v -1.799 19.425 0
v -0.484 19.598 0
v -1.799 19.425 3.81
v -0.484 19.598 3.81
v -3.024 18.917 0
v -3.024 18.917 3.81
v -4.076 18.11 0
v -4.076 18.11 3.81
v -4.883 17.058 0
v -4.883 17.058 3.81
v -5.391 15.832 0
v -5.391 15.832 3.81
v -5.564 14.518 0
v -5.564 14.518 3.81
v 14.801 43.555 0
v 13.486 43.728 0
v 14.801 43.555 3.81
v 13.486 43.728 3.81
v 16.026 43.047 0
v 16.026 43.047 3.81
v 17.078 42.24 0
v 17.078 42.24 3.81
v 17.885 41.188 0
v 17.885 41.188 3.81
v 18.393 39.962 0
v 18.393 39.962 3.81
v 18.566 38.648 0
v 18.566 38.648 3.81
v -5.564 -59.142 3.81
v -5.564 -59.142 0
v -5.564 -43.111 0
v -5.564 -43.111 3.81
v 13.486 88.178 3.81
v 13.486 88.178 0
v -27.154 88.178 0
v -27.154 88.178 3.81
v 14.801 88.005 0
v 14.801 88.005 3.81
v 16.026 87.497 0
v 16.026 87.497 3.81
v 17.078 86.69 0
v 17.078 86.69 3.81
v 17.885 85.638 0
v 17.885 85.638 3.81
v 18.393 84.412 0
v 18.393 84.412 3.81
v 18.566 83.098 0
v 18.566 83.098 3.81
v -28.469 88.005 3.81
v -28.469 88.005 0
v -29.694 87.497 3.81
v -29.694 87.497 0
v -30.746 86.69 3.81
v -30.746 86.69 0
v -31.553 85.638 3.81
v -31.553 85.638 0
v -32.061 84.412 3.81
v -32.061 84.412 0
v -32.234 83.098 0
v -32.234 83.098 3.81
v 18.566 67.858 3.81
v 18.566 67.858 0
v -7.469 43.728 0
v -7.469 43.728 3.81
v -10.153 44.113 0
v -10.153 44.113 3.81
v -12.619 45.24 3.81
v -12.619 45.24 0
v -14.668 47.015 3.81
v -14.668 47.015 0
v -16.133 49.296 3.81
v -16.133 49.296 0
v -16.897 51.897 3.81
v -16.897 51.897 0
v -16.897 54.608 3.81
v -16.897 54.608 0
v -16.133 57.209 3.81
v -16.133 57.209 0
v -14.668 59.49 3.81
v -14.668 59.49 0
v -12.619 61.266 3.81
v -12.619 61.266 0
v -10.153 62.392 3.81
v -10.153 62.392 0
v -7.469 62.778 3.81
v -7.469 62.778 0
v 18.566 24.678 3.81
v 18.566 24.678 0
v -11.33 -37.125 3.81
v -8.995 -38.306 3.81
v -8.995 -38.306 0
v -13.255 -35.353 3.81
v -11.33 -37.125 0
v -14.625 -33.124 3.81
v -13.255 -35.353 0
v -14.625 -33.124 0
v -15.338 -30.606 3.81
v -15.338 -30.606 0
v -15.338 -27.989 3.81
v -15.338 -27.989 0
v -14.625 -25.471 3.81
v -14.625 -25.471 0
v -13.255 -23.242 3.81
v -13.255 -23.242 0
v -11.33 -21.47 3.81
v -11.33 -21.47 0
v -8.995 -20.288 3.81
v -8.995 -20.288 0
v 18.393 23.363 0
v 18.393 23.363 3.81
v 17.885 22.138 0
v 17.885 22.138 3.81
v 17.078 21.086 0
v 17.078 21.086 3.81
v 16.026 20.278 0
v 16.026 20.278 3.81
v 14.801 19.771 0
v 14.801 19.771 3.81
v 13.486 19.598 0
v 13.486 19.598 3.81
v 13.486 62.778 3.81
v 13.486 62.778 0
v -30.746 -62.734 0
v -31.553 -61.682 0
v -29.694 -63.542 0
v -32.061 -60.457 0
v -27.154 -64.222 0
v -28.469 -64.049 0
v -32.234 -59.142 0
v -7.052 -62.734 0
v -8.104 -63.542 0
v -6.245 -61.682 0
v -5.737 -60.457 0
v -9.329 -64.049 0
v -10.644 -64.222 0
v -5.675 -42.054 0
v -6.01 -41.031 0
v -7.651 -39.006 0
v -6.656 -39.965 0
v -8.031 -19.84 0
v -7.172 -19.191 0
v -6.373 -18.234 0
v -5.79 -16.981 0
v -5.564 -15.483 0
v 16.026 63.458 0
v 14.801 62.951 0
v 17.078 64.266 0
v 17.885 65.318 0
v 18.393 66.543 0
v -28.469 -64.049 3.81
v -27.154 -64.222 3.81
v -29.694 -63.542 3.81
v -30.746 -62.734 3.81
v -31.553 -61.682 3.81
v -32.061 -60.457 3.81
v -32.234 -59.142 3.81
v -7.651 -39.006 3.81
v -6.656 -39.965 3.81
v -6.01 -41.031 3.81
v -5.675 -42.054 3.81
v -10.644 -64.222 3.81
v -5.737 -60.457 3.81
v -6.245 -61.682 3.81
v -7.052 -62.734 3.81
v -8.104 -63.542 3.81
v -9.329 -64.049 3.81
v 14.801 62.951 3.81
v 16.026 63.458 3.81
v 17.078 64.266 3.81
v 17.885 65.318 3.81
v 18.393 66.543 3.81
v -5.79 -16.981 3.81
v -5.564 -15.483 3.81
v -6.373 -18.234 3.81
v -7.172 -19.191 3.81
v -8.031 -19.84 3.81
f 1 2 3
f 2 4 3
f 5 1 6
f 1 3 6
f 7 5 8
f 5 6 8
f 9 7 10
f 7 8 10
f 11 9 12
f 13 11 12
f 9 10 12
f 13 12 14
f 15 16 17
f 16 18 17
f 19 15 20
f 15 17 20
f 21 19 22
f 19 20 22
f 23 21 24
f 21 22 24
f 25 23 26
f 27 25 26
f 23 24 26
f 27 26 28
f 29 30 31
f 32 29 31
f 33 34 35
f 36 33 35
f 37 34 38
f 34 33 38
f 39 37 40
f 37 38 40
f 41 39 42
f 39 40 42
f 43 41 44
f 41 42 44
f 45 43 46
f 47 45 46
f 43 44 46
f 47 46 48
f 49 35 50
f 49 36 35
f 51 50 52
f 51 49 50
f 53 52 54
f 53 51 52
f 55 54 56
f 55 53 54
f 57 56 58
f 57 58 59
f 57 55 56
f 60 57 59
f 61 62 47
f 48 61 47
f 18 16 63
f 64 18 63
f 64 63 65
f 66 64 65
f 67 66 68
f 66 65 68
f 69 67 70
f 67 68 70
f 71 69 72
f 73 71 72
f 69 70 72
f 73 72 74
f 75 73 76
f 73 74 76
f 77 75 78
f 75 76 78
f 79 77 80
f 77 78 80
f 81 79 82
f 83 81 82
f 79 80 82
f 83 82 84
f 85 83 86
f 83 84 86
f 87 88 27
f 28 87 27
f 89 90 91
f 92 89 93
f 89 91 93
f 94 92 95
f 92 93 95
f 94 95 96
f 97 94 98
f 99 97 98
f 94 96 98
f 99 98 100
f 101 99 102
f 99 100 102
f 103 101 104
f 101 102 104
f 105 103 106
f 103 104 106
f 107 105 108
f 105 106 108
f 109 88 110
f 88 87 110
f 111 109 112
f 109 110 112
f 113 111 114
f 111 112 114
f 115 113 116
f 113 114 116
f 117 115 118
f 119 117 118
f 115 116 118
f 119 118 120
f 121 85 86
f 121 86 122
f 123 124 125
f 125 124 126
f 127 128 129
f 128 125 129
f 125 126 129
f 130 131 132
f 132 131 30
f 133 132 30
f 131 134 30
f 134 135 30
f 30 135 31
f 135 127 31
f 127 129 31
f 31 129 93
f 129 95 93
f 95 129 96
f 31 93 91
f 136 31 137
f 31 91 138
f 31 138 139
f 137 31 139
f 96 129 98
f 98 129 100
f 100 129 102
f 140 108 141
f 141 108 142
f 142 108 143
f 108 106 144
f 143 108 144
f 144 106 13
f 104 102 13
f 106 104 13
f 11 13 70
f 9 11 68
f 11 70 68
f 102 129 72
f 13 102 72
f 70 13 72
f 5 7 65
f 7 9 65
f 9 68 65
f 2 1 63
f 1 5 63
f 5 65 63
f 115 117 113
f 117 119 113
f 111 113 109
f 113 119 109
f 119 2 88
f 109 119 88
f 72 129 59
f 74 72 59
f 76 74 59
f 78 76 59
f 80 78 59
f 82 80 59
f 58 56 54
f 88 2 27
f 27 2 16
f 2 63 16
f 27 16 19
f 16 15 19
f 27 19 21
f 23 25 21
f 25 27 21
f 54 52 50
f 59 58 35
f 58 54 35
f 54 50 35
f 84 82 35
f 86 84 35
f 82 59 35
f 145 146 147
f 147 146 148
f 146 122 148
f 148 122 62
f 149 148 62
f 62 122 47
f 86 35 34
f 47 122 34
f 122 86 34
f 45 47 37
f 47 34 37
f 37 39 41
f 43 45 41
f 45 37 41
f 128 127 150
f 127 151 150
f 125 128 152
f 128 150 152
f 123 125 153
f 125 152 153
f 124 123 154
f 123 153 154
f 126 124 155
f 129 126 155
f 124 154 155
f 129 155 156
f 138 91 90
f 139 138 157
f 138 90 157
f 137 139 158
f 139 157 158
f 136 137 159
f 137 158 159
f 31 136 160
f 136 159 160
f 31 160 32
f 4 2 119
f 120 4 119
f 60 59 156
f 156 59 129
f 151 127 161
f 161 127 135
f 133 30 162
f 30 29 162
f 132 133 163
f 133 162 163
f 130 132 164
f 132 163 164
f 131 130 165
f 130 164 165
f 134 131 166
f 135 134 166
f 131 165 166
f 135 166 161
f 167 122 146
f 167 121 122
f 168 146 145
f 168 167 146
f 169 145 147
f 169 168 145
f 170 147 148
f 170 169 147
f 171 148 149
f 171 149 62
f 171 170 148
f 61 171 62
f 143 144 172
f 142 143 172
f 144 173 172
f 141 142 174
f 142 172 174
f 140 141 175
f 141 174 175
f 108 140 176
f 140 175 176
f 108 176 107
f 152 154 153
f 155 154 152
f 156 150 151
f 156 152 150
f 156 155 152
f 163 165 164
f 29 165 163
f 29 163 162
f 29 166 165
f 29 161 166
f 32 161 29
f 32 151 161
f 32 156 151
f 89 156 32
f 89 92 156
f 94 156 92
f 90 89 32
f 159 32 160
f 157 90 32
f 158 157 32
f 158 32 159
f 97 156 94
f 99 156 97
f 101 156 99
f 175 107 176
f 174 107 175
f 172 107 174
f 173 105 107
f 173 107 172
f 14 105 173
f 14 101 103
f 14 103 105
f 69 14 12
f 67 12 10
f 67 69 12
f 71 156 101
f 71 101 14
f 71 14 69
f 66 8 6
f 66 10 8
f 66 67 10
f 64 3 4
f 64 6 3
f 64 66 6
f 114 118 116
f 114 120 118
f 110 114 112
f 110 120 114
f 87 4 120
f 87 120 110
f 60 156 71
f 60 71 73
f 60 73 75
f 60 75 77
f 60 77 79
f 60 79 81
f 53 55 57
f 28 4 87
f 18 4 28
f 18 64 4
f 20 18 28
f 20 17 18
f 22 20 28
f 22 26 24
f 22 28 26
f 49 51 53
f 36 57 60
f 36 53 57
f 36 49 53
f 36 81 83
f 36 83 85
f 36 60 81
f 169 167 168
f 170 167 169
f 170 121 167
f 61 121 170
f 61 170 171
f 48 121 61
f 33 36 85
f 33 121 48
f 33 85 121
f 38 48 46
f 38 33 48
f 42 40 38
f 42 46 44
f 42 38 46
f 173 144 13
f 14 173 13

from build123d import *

# Parameters (mm, degrees)
F1_DEPTH = 3.81
F2_W     = 23.2185392497
F2_H     = 19.05
F3_DEPTH = 25.4
F4_R     = 5.08


with BuildPart() as f1:
    # F0 (on Top) → F1 (new body)
    with BuildSketch(Plane.XY):
        with BuildLine():
            Line((18.5659871323, 88.1776532905), (-32.2340128677, 88.1776532905))
            Line((-32.2340128677, 88.1776532905), (-32.2340128677, -64.2223467095))
            Line((-32.2340128677, -64.2223467095), (-5.5640128677, -64.2223467095))
            Line((-5.5640128677, -64.2223467095), (-5.5640128677, -38.8223467095))
            Line((-5.5640128677, -38.8223467095), (-5.9028261468, -38.8223467095))
            ThreePointArc((-5.9028261468, -38.8223467095), (-15.4278261468, -29.2973467095), (-5.9028261468, -19.7723467095))
            Line((-5.9028261468, -19.7723467095), (-5.5640128677, -19.7723467095))
            Line((-5.5640128677, -19.7723467095), (-5.5640128677, 19.5976532905))
            Line((-5.5640128677, 19.5976532905), (18.5659871323, 19.5976532905))
            Line((18.5659871323, 19.5976532905), (18.5659871323, 88.1776532905))
        make_face()
        with BuildLine():
            ThreePointArc((-7.4690128677, 43.7276532905), (-16.9940128677, 53.2526532905), (-7.4690128677, 62.7776532905))
            Line((-7.4690128677, 62.7776532905), (1.4209871323, 62.7776532905))
            ThreePointArc((1.4209871323, 62.7776532905), (10.9459871323, 53.2526532905), (1.4209871323, 43.7276532905))
            Line((1.4209871323, 43.7276532905), (-7.4690128677, 43.7276532905))
        make_face(mode=Mode.SUBTRACT)
    extrude(amount=F1_DEPTH)

    # F2 (on face) → F3 (cut)
    with BuildSketch(Plane.XY.offset(3.81)):
        with Locations((13.0302567572, 53.2526532905)):
            Rectangle(F2_W, F2_H)
    extrude(amount=-F3_DEPTH, mode=Mode.SUBTRACT)

    # F4
    f4_edges = [f1.edges().sort_by_distance(p)[0] for p in [
        (18.565987, 88.177653, 1.905),
        (-32.234013, 88.177653, 1.905),
        (-32.234013, -64.222347, 1.905),
        (-5.564013, -64.222347, 1.905),
        (-5.564013, -19.772347, 1.905),
        (-5.564013, -38.822347, 1.905),
        (18.565987, 19.597653, 1.905),
        (-5.564013, 19.597653, 1.905),
        (18.565987, 43.727653, 1.905),
        (18.565987, 62.777653, 1.905),
    ]]
    fillet(f4_edges, radius=F4_R)


solid = f1.part
